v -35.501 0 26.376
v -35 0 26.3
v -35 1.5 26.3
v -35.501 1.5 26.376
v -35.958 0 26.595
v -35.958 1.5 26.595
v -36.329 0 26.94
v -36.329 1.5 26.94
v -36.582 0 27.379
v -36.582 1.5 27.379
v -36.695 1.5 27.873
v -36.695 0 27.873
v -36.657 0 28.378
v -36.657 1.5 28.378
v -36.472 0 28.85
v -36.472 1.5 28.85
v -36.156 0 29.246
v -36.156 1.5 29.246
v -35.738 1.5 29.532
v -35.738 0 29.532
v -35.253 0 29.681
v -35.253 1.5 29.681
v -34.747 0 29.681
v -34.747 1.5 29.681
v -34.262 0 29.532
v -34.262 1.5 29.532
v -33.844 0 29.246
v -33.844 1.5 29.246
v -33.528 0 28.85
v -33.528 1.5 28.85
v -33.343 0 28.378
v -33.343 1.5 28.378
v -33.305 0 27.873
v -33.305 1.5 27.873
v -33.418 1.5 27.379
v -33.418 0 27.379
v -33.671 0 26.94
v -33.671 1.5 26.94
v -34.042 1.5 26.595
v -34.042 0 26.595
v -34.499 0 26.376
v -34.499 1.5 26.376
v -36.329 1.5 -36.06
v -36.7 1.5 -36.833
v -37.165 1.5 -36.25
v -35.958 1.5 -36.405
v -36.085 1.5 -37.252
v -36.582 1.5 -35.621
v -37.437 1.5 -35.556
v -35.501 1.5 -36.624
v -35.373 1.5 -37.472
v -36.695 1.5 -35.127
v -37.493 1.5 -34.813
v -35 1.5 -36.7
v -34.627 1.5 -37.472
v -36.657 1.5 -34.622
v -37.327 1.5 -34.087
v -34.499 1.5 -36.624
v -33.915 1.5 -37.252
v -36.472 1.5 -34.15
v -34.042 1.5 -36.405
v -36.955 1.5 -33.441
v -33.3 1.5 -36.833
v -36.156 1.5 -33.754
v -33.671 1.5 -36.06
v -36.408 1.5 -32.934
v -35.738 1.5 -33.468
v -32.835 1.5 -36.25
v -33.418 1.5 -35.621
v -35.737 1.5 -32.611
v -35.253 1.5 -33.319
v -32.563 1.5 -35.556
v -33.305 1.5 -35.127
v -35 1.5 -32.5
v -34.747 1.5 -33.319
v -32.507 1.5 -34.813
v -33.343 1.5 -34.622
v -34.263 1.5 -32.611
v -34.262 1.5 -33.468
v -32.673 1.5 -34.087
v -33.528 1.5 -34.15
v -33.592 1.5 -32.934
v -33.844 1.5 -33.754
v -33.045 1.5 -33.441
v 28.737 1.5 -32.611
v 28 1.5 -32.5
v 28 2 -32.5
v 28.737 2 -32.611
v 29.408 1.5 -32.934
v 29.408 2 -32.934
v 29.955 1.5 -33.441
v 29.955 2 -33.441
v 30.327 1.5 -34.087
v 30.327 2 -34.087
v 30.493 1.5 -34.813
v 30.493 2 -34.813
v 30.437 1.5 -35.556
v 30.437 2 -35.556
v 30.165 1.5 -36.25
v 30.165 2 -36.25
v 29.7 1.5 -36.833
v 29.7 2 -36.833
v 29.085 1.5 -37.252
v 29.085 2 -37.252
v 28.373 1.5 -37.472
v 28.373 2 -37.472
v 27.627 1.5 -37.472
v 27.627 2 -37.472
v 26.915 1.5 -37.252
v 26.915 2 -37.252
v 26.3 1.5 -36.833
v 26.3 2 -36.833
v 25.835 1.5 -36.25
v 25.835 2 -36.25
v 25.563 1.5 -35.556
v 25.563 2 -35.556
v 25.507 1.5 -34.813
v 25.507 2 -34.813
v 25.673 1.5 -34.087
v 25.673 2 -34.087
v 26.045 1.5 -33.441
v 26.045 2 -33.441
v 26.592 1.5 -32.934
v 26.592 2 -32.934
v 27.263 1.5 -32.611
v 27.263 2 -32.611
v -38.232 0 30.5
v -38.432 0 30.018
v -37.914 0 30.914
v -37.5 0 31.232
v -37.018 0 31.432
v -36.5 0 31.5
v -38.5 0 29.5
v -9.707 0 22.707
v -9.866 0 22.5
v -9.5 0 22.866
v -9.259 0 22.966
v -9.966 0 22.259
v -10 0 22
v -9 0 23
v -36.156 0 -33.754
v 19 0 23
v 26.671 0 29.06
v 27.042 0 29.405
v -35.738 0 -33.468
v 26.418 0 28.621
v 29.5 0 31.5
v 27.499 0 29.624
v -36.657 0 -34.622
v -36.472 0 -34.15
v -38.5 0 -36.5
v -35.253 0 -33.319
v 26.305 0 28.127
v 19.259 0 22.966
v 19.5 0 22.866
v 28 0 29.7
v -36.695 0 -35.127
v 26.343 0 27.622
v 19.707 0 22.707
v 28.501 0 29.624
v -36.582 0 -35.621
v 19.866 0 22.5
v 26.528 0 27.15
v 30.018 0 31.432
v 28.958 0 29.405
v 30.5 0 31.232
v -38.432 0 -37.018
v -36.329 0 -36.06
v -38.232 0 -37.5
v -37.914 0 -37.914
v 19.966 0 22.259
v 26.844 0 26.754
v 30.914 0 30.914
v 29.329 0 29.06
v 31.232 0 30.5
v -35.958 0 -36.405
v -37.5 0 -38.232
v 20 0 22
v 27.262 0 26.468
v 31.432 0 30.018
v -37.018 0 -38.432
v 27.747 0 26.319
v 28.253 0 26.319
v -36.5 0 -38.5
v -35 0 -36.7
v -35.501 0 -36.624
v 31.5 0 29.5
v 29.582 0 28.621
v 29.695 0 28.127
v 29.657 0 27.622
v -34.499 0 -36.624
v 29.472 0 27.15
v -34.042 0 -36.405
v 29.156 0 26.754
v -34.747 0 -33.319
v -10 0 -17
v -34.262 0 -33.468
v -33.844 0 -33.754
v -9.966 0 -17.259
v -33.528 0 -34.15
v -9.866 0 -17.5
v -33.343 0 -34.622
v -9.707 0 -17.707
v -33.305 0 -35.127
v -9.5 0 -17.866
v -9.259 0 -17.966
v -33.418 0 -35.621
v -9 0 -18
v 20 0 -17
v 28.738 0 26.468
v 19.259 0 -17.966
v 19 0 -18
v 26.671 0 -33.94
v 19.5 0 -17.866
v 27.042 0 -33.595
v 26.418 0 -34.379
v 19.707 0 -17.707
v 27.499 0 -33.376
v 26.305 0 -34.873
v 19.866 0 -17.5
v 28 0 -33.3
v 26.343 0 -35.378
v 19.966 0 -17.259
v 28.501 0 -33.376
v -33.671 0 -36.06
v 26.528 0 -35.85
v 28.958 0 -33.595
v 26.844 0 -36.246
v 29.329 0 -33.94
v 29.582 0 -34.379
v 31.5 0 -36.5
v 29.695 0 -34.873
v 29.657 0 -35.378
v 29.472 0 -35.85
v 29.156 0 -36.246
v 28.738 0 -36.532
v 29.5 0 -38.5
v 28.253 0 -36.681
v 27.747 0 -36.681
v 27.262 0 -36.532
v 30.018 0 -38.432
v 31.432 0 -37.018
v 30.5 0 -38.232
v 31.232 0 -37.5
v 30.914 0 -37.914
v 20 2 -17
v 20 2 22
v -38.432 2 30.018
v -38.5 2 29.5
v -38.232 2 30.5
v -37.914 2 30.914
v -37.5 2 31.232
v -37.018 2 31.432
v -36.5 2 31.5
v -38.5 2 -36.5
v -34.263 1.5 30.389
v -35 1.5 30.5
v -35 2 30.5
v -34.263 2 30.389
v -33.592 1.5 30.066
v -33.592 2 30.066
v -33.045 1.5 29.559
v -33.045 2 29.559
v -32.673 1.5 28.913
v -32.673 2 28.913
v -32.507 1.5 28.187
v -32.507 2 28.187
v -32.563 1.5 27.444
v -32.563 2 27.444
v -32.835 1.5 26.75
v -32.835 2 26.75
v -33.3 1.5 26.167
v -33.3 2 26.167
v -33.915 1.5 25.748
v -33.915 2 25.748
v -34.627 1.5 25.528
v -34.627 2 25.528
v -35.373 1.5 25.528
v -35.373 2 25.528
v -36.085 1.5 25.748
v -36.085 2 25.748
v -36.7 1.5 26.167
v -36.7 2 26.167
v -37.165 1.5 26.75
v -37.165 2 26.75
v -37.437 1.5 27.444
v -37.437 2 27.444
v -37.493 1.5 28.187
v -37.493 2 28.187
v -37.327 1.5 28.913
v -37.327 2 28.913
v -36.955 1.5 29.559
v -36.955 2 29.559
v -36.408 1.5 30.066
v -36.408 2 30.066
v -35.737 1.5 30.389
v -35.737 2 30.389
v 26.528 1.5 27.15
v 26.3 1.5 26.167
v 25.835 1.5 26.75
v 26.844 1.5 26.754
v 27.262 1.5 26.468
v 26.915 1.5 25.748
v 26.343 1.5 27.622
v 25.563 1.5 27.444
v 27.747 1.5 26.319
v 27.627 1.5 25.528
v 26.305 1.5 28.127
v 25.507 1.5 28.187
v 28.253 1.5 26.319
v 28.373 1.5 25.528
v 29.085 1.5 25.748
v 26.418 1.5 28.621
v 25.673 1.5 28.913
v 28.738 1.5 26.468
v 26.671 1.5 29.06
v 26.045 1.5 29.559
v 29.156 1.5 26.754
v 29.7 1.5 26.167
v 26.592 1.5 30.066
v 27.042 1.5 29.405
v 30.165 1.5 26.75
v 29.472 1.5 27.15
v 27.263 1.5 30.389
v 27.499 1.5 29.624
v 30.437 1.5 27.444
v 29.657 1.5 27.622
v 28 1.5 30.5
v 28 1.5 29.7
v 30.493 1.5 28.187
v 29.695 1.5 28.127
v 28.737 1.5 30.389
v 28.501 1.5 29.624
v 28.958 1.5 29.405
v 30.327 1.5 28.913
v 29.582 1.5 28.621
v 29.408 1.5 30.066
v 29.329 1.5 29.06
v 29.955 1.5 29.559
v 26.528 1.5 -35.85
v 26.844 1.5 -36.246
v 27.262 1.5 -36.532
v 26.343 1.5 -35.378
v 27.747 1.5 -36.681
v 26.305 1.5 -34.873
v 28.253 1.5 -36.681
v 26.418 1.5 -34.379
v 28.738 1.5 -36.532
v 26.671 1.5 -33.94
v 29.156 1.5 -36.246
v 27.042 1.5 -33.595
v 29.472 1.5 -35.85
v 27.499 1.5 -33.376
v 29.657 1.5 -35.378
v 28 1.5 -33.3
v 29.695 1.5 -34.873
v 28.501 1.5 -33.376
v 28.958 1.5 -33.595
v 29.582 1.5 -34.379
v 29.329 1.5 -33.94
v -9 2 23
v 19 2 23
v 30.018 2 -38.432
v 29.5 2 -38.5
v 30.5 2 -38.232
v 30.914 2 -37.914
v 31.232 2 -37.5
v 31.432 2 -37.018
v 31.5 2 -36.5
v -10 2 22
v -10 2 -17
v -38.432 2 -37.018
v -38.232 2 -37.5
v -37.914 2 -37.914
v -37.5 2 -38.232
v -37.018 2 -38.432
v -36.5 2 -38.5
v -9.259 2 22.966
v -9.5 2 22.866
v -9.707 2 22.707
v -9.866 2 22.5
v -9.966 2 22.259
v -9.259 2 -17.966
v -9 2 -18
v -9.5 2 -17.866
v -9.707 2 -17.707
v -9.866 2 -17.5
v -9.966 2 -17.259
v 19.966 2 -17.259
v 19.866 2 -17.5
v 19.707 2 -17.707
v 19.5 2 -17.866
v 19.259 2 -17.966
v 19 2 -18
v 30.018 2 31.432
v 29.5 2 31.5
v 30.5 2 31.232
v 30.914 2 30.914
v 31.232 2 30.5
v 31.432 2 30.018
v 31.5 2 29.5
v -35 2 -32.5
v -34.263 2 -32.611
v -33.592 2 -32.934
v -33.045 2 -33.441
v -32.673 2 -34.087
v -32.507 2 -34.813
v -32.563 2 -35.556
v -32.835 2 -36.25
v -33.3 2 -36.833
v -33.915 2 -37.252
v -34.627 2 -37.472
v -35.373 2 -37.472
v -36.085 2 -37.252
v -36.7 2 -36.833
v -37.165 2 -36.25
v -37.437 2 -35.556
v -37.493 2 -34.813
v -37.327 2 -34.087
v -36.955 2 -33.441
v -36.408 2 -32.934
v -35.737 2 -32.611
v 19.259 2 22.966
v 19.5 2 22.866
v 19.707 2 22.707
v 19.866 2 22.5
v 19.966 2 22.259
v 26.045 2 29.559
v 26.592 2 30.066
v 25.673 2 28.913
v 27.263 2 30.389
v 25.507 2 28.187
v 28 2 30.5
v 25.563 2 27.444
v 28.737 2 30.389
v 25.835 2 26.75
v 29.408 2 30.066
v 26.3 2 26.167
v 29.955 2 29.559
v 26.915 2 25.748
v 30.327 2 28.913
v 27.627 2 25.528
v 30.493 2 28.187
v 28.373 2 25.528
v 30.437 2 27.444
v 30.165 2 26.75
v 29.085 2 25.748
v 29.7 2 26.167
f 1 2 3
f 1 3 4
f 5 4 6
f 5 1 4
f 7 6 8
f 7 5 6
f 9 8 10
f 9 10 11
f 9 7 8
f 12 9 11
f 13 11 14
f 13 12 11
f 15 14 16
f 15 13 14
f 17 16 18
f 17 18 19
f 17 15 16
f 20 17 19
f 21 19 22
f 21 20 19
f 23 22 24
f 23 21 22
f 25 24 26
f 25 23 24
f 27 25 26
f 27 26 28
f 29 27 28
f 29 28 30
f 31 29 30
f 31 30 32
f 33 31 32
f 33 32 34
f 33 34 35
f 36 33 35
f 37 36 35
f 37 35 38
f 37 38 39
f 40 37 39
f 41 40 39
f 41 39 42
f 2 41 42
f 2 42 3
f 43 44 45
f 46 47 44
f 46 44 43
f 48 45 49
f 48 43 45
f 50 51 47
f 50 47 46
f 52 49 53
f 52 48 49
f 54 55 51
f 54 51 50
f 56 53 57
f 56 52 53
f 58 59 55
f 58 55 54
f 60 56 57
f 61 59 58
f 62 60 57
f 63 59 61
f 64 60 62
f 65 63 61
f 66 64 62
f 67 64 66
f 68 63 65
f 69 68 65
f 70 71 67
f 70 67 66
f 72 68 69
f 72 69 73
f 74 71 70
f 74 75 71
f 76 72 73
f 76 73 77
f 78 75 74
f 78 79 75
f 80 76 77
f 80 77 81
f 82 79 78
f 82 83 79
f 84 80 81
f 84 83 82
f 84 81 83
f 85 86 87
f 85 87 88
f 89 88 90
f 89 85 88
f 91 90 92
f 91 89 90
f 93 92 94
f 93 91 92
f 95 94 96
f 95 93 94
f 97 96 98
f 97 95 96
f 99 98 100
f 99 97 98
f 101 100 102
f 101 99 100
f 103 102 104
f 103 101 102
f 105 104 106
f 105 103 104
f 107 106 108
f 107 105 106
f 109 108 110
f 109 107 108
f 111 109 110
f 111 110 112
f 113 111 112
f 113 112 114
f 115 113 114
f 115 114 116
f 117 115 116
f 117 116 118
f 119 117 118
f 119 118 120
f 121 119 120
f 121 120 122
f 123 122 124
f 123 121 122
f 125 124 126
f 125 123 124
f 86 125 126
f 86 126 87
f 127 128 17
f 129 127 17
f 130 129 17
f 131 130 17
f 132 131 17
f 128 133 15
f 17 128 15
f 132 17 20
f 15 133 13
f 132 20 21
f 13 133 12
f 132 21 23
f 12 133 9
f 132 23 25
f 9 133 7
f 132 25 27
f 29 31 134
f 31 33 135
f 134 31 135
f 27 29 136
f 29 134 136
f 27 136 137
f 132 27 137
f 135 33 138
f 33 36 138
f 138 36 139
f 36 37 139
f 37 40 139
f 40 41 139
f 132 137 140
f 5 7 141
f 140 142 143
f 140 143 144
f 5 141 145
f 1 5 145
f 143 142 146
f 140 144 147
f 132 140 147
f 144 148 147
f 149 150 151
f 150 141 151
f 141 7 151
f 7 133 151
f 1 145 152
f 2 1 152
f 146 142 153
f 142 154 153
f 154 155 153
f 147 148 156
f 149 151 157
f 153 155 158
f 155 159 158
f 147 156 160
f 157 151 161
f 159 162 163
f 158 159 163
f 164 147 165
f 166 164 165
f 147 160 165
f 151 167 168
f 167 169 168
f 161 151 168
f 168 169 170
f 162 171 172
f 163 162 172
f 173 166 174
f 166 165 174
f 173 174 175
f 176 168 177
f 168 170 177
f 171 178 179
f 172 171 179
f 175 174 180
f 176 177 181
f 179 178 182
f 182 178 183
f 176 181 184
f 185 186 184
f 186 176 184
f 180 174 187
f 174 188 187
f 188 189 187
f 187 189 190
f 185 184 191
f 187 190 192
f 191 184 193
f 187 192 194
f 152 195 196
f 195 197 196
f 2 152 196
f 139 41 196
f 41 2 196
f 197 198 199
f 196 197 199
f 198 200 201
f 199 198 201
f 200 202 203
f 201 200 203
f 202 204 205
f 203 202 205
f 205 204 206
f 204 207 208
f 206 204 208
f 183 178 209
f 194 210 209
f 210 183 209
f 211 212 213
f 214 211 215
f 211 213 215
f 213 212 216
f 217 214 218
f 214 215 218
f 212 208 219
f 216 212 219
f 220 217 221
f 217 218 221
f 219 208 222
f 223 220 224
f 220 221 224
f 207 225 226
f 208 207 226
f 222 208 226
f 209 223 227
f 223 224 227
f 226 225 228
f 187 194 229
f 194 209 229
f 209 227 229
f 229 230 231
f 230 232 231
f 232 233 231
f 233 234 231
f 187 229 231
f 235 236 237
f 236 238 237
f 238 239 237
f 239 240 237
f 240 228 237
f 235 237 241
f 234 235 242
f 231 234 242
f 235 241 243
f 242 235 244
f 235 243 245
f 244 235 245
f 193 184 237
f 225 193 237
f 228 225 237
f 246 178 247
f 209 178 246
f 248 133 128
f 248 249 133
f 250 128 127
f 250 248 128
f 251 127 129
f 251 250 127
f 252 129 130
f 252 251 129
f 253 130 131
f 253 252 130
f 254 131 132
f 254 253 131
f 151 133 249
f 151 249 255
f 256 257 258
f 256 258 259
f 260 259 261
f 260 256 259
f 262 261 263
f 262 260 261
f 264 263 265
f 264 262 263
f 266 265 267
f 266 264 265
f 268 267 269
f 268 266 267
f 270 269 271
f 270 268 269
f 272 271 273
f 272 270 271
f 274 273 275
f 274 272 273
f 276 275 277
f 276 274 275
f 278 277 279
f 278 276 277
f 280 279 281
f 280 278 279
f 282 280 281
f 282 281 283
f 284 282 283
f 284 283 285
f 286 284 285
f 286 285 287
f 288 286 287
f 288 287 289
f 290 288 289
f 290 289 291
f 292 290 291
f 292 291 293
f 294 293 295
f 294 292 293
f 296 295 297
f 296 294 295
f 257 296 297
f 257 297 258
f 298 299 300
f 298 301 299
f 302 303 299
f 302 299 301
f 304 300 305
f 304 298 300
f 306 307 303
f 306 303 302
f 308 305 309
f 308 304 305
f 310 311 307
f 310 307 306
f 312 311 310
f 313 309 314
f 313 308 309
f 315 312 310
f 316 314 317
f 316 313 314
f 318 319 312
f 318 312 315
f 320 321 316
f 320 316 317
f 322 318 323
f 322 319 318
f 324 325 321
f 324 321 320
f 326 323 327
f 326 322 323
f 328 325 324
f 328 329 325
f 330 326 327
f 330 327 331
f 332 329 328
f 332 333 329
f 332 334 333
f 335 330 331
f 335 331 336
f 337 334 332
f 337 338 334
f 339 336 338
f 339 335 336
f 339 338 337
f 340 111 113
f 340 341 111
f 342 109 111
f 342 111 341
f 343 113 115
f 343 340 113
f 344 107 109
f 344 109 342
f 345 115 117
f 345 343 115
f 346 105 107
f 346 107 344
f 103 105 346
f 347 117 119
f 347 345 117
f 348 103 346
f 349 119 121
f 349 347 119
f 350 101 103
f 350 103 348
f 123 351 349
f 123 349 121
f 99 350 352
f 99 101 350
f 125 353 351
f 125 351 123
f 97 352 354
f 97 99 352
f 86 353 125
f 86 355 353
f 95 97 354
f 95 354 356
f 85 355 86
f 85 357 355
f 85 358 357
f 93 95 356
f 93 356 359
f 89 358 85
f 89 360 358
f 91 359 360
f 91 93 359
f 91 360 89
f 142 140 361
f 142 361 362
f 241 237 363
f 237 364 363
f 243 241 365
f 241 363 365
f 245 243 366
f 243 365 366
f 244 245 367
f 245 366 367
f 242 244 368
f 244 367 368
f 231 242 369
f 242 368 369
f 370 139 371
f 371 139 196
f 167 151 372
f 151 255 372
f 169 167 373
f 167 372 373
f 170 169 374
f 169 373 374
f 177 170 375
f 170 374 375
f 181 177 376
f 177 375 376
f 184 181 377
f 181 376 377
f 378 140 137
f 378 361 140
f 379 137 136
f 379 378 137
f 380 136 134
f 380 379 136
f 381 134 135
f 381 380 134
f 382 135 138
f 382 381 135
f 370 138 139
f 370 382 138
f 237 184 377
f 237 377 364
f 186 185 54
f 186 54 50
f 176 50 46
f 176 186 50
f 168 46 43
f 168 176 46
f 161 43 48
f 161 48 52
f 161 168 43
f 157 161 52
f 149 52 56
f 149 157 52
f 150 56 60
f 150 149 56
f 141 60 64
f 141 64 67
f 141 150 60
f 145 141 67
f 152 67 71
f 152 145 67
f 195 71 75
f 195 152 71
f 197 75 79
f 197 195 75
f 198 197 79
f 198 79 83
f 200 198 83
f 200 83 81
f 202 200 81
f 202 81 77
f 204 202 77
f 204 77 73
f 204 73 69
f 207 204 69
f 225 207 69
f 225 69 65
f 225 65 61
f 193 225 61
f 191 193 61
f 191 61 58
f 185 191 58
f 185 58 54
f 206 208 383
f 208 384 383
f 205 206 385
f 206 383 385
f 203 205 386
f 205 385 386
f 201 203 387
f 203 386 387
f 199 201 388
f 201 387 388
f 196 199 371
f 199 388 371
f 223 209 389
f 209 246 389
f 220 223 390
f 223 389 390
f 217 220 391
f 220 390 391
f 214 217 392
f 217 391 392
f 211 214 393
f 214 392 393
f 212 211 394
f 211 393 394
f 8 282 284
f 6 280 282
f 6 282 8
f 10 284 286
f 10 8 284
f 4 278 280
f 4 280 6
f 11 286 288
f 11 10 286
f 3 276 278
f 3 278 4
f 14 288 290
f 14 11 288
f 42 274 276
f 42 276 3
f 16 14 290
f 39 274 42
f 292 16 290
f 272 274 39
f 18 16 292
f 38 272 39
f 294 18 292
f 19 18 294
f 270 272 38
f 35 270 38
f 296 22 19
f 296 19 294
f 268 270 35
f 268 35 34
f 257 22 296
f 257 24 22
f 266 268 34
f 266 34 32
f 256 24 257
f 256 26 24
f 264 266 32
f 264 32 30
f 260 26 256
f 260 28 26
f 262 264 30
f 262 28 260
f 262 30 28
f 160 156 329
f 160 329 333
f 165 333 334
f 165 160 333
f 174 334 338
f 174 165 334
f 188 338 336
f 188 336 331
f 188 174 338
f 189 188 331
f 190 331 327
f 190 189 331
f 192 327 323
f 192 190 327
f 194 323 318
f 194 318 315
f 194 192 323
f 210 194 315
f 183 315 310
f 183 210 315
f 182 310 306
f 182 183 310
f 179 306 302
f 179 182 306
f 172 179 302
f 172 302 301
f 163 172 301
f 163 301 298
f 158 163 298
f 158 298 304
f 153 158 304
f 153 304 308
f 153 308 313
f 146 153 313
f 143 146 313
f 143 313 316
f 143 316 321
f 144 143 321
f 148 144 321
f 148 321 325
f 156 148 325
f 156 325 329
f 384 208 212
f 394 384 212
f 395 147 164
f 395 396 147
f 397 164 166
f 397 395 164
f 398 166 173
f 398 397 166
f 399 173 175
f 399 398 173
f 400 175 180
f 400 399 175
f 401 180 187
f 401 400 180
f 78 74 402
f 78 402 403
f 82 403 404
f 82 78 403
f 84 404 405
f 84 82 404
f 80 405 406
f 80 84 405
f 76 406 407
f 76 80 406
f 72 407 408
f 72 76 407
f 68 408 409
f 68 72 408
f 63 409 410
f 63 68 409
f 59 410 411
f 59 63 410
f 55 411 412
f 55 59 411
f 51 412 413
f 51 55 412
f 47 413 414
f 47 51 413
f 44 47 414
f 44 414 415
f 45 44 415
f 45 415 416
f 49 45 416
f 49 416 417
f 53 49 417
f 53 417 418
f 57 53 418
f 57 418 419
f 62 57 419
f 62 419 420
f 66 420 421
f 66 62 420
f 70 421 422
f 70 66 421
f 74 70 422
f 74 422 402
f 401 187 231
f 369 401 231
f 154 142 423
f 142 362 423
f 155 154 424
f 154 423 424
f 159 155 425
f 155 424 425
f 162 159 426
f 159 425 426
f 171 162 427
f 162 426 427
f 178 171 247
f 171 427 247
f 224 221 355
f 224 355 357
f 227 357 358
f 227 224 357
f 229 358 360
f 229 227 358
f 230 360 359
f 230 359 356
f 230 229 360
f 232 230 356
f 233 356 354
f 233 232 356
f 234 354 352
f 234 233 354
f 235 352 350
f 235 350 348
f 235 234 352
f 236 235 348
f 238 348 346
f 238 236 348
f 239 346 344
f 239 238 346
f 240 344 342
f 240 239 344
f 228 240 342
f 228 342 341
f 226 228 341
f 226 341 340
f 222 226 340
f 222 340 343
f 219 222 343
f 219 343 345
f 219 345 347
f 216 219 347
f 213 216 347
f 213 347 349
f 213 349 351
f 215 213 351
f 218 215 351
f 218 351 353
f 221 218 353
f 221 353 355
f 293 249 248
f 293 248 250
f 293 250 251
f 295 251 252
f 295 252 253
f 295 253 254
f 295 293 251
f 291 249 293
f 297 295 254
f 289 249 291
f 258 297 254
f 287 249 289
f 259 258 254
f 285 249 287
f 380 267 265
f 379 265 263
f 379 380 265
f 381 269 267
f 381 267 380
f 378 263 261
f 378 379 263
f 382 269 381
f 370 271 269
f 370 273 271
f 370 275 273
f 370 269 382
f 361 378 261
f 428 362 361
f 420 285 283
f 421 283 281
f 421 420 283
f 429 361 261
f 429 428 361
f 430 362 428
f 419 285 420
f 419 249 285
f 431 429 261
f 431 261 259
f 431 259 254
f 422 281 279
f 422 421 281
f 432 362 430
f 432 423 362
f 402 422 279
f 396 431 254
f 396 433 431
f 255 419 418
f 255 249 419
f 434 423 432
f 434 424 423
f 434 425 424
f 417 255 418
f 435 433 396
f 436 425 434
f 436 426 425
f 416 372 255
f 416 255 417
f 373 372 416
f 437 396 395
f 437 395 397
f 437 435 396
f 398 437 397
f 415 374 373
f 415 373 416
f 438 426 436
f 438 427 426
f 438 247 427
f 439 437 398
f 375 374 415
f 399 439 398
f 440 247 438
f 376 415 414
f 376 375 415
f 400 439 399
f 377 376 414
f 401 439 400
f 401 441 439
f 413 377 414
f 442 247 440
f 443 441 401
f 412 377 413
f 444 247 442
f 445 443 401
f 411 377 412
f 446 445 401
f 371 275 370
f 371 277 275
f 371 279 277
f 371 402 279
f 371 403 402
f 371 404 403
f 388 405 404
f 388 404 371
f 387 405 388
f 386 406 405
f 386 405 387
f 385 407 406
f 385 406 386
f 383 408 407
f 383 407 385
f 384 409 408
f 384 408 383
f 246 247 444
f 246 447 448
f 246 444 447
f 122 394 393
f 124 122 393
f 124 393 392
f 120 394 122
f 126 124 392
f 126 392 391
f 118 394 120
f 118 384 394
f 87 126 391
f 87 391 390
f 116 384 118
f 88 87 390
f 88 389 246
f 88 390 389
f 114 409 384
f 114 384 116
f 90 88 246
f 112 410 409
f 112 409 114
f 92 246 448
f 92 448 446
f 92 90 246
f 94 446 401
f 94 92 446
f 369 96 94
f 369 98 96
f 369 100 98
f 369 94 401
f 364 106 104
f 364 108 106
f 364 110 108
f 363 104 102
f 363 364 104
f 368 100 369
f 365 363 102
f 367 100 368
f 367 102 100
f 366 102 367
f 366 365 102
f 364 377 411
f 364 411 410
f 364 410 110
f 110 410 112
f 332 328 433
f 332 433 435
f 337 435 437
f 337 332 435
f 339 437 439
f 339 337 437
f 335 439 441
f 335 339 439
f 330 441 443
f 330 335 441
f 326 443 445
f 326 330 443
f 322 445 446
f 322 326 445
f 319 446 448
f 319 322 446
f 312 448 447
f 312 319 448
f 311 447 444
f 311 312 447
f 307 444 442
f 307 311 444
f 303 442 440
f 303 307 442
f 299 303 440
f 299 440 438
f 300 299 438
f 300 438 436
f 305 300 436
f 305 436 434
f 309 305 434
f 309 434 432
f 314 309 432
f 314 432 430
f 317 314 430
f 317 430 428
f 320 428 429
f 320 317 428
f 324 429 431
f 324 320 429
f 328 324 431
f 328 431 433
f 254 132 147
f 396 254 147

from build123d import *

# Parameters (mm, degrees)
SKETCH_1_W          = 70
SKETCH_1_H          = 70
SKETCH_1_R          = 1.7
SKETCH_1_W_2        = 30
SKETCH_1_H_2        = 41
EXTRUDE_1_DEPTH     = 2
FILLET_1_R          = 2
FILLET_2_R          = 1
CUT_EXTRUDE_START   = -0.5
SKETCH_2_R          = 2.5
SKETCH_2_R_2        = 1.7
CUT_EXTRUDE_1_DEPTH = 0.5


with BuildPart() as part:
    # 草图1 → 凸台-拉伸1 (new body)
    with BuildSketch(Plane(origin=(0, 0, 0), x_dir=(1, 0, 0), z_dir=(0, 1, 0))):
        with Locations((-3.5, 3.5)):
            Rectangle(SKETCH_1_W, SKETCH_1_H)
        with Locations(Location((28, -28, 0), (0, 0, 270))):
            Circle(SKETCH_1_R, mode=Mode.SUBTRACT)
        with Locations(Location((28, 35, 0), (0, 0, 270))):
            Circle(SKETCH_1_R, mode=Mode.SUBTRACT)
        with Locations(Location((-35, -28, 0), (0, 0, 90))):
            Circle(SKETCH_1_R, mode=Mode.SUBTRACT)
        with Locations(Location((-35, 35, 0), (0, 0, 90))):
            Circle(SKETCH_1_R, mode=Mode.SUBTRACT)
        with Locations((5, -2.5)):
            Rectangle(SKETCH_1_W_2, SKETCH_1_H_2, mode=Mode.SUBTRACT)
    extrude(amount=EXTRUDE_1_DEPTH)

    # 圆角1
    fillet_1_edges = [part.edges().sort_by_distance(p)[0] for p in [
        (-38.5, 1, -38.5),
        (31.5, 1, -38.5),
        (31.5, 1, 31.5),
        (-38.5, 1, 31.5),
    ]]
    fillet(fillet_1_edges, radius=FILLET_1_R)

    # 圆角2
    fillet_2_edges = [part.edges().sort_by_distance(p)[0] for p in [
        (-10, 1, -18),
        (-10, 1, 23),
        (20, 1, 23),
        (20, 1, -18),
    ]]
    fillet(fillet_2_edges, radius=FILLET_2_R)

    # 草图2 → 切除-拉伸1 (cut)
    # profile 1 of 4: a face of its own
    with BuildSketch(Plane(origin=(0, 2, 0), x_dir=(1, 0, 0), z_dir=(0, 1, 0)).offset(CUT_EXTRUDE_START)):
        with Locations(Location((-35, 35, 0), (0, 0, 270))):
            Circle(SKETCH_2_R)
        with Locations(Location((-35, 35, 0), (0, 0, 90))):
            Circle(SKETCH_2_R_2, mode=Mode.SUBTRACT)
    # profile 2 of 4: a face of its own
    with BuildSketch(Plane(origin=(0, 2, 0), x_dir=(1, 0, 0), z_dir=(0, 1, 0)).offset(CUT_EXTRUDE_START)):
        with Locations(Location((28, 35, 0), (0, 0, 270))):
            Circle(SKETCH_2_R)
        with Locations(Location((28, 35, 0), (0, 0, 270))):
            Circle(SKETCH_2_R_2, mode=Mode.SUBTRACT)
    # profile 3 of 4: a face of its own
    with BuildSketch(Plane(origin=(0, 2, 0), x_dir=(1, 0, 0), z_dir=(0, 1, 0)).offset(CUT_EXTRUDE_START)):
        with Locations(Location((28, -28, 0), (0, 0, 270))):
            Circle(SKETCH_2_R)
        with Locations(Location((28, -28, 0), (0, 0, 270))):
            Circle(SKETCH_2_R_2, mode=Mode.SUBTRACT)
    # profile 4 of 4: a face of its own
    with BuildSketch(Plane(origin=(0, 2, 0), x_dir=(1, 0, 0), z_dir=(0, 1, 0)).offset(CUT_EXTRUDE_START)):
        with Locations(Location((-35, -28, 0), (0, 0, 270))):
            Circle(SKETCH_2_R)
        with Locations(Location((-35, -28, 0), (0, 0, 90))):
            Circle(SKETCH_2_R_2, mode=Mode.SUBTRACT)
    extrude(amount=CUT_EXTRUDE_1_DEPTH, mode=Mode.SUBTRACT)


solid = part.part
